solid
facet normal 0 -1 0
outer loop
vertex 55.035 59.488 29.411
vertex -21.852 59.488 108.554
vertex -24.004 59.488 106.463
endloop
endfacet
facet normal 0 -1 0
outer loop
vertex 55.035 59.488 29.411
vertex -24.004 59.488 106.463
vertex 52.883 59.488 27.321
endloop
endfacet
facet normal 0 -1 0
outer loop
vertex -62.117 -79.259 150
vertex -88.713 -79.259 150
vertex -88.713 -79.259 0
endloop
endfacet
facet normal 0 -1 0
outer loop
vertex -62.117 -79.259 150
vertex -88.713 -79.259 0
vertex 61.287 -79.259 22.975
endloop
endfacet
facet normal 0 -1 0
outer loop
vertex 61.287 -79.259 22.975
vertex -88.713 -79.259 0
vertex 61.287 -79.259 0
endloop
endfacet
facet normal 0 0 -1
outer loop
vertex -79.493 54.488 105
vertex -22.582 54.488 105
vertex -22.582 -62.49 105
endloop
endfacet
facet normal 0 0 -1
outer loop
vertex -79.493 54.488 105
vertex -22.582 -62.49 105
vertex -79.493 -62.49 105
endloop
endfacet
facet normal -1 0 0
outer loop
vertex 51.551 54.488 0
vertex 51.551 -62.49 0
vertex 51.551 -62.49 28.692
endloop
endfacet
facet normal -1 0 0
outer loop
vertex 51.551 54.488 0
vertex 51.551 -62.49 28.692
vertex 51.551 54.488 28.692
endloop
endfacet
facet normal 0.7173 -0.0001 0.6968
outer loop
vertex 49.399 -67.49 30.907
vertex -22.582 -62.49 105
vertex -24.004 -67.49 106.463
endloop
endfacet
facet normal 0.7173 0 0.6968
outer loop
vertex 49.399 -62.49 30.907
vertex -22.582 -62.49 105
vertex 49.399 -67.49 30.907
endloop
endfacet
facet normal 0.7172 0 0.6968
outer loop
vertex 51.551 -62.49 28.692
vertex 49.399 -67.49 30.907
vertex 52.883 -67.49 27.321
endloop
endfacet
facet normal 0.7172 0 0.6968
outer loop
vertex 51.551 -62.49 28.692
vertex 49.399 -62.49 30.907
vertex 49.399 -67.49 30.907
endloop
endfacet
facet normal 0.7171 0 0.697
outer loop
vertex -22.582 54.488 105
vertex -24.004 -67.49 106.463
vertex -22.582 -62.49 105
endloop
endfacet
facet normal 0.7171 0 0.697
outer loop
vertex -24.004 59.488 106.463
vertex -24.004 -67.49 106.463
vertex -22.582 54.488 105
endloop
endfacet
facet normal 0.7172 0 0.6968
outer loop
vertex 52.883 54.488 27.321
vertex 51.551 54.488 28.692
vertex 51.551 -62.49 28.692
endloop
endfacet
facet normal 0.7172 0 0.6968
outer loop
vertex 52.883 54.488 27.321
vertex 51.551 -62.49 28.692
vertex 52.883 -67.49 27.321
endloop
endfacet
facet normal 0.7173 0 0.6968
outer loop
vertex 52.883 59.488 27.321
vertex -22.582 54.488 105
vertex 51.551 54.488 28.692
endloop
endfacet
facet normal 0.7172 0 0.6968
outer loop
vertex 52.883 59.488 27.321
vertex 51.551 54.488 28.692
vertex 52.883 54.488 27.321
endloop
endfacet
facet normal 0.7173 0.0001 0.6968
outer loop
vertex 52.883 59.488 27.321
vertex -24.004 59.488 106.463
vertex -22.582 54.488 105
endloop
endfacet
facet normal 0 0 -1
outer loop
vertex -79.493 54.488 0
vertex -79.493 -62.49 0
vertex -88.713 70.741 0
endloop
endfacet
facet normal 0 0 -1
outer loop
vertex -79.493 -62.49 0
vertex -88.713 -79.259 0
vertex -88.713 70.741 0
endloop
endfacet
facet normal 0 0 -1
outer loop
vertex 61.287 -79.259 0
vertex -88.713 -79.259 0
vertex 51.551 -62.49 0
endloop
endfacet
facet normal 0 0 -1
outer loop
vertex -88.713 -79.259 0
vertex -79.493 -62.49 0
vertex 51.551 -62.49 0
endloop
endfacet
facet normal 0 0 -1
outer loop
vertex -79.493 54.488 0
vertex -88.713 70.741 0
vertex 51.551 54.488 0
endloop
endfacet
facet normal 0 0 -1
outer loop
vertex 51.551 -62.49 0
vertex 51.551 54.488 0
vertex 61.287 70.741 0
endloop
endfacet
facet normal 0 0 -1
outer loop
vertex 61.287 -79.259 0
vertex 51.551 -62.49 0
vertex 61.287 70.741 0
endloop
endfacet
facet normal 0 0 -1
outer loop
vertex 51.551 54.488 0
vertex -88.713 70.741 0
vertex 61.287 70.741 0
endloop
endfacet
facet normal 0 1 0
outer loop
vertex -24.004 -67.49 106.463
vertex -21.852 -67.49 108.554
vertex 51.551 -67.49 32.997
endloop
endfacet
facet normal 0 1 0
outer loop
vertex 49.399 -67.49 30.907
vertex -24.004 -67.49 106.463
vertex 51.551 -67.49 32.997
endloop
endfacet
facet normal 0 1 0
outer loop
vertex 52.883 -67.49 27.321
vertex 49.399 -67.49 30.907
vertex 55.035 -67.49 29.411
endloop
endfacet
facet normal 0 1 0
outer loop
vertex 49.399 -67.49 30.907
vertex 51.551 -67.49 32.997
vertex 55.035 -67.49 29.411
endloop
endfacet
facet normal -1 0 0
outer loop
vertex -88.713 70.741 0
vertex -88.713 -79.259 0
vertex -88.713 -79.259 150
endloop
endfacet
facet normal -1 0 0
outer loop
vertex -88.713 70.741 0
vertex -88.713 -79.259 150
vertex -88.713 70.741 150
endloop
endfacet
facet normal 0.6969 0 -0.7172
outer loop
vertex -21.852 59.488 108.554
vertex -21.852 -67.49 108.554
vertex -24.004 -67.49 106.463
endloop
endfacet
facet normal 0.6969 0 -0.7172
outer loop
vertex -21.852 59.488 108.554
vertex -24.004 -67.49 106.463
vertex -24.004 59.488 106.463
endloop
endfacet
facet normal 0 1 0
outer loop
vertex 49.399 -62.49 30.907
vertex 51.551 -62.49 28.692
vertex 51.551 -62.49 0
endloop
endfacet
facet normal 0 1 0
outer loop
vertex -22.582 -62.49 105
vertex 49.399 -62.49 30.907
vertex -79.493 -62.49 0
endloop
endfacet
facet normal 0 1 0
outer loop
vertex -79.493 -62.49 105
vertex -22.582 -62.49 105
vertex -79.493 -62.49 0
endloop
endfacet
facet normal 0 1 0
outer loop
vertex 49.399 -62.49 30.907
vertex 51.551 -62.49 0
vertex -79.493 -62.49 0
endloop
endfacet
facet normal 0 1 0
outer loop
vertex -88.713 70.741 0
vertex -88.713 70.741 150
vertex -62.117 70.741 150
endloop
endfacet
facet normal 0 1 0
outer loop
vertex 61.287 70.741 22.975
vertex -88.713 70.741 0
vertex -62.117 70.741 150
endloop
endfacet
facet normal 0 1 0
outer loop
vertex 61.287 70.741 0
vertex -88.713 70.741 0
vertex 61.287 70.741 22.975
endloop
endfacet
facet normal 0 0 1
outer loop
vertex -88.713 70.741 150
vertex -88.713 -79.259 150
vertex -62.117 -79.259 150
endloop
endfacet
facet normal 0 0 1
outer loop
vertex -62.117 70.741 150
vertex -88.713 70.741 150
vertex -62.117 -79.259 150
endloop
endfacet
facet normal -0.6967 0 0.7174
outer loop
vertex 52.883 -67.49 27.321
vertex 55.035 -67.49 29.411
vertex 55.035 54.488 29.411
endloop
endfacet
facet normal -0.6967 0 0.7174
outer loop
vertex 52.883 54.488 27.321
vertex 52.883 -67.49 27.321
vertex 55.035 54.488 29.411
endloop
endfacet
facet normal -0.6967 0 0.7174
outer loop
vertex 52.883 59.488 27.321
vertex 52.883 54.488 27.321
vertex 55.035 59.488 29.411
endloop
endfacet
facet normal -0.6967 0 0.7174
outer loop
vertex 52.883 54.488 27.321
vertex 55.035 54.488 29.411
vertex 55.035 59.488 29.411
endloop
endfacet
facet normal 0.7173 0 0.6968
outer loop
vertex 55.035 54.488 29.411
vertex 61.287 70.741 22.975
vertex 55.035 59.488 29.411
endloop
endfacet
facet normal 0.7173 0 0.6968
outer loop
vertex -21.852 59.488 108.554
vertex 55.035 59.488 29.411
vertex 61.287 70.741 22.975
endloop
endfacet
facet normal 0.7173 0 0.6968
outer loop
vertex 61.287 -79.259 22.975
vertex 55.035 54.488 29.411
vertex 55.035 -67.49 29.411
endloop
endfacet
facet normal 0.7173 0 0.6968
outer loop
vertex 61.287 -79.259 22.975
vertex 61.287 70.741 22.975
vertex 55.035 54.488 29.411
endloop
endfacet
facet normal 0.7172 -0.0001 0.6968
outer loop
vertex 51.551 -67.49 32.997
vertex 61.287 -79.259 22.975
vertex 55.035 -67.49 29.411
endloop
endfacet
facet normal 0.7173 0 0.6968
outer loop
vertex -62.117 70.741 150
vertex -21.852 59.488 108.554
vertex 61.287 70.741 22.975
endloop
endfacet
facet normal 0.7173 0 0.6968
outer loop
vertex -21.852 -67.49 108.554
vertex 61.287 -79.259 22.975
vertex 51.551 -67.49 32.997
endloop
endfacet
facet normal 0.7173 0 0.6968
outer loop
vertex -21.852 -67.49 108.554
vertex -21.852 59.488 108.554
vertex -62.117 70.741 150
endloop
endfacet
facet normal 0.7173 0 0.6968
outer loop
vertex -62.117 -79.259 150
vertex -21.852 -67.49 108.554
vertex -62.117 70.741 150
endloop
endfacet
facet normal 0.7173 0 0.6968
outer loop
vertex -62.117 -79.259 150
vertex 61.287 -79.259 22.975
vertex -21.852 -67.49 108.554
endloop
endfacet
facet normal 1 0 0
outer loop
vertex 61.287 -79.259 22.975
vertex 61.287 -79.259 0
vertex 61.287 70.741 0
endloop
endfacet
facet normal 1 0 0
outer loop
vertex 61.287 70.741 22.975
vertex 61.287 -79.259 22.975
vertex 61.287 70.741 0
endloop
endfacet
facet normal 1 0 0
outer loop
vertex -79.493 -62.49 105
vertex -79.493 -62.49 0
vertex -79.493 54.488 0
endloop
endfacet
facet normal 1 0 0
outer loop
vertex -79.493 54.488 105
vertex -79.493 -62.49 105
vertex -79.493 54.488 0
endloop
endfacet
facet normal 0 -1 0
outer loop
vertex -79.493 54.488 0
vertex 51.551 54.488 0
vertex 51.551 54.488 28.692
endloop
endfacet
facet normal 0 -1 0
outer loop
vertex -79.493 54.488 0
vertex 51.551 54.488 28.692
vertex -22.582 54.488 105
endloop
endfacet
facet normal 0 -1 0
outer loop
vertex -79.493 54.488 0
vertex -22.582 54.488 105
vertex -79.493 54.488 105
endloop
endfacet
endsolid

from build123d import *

# Parameters (mm, degrees)
SKETCH3_W           = 150
SKETCH3_H           = 150
BOSS_EXTRUDE2_DEPTH = 150
CUT_EXTRUDE3_DEPTH  = 150
SKETCH8_W           = 131.044313332
SKETCH8_H           = 116.977993985
CUT_EXTRUDE7_DEPTH  = 105
SKETCH9_W           = 4.954866237
SKETCH9_H           = 116.977993985
CUT_EXTRUDE10_DEPTH = 3
SKETCH10_W          = 105.341543671
SKETCH10_H          = 5
CUT_EXTRUDE12_DEPTH = 3
SKETCH11_W          = 5
SKETCH11_H          = 121.977993985
CUT_EXTRUDE13_DEPTH = 3
SKETCH12_W          = 110.341543671
SKETCH12_H          = 5
CUT_EXTRUDE14_DEPTH = 3


with BuildPart() as part:
    # Sketch3 → Boss-Extrude2 (new body)
    with BuildSketch(Plane.XY):
        with Locations((-13.712644514, -4.259252527)):
            Rectangle(SKETCH3_W, SKETCH3_H)
    extrude(amount=BOSS_EXTRUDE2_DEPTH)

    # Sketch6 → Cut-Extrude3 (cut)
    with BuildSketch(Plane.XZ.offset(79.259252527)):
        Polygon((61.287355486, 22.975304178), (-62.11733168, 150), (61.287355486, 150), align=None)
    extrude(amount=-CUT_EXTRUDE3_DEPTH, mode=Mode.SUBTRACT)

    # Sketch8 → Cut-Extrude7 (cut)
    with BuildSketch(Plane(origin=(0, 0, 0), x_dir=(-1, 0, 0), z_dir=(0, 0, -1))):
        with Locations((13.971216561, -4.00068048)):
            Rectangle(SKETCH8_W, SKETCH8_H)
    extrude(amount=-CUT_EXTRUDE7_DEPTH, mode=Mode.SUBTRACT)

    # Sketch9 → Cut-Extrude10 (cut)
    with BuildSketch(Plane(origin=(43.01226643, 0, 41.786482925), x_dir=(0.696812609304925, 0, -0.71725322412218), z_dir=(0.71725322412218, 0, 0.696812609304925))):
        with Locations((-90.610208196, -4.00068048)):
            Rectangle(SKETCH9_W, SKETCH9_H)
    extrude(amount=-CUT_EXTRUDE10_DEPTH, mode=Mode.SUBTRACT)

    # Sketch10 → Cut-Extrude12 (cut)
    with BuildSketch(Plane(origin=(43.01226643, 0, 41.786482925), x_dir=(0.696812609304925, 0, -0.71725322412218), z_dir=(0.71725322412218, 0, 0.696812609304925))):
        with Locations((-40.416869479, -64.989677472)):
            Rectangle(SKETCH10_W, SKETCH10_H)
    extrude(amount=-CUT_EXTRUDE12_DEPTH, mode=Mode.SUBTRACT)

    # Sketch11 → Cut-Extrude13 (cut)
    with BuildSketch(Plane(origin=(43.01226643, 0, 41.786482925), x_dir=(0.696812609304925, 0, -0.71725322412218), z_dir=(0.71725322412218, 0, 0.696812609304925))):
        with Locations((14.753902357, -6.50068048)):
            Rectangle(SKETCH11_W, SKETCH11_H)
    extrude(amount=-CUT_EXTRUDE13_DEPTH, mode=Mode.SUBTRACT)

    # Sketch12 → Cut-Extrude14 (cut)
    with BuildSketch(Plane(origin=(43.01226643, 0, 41.786482925), x_dir=(0.696812609304925, 0, -0.71725322412218), z_dir=(0.71725322412218, 0, 0.696812609304925))):
        with Locations((-37.916869479, 56.988316513)):
            Rectangle(SKETCH12_W, SKETCH12_H)
    extrude(amount=-CUT_EXTRUDE14_DEPTH, mode=Mode.SUBTRACT)


solid = part.part
